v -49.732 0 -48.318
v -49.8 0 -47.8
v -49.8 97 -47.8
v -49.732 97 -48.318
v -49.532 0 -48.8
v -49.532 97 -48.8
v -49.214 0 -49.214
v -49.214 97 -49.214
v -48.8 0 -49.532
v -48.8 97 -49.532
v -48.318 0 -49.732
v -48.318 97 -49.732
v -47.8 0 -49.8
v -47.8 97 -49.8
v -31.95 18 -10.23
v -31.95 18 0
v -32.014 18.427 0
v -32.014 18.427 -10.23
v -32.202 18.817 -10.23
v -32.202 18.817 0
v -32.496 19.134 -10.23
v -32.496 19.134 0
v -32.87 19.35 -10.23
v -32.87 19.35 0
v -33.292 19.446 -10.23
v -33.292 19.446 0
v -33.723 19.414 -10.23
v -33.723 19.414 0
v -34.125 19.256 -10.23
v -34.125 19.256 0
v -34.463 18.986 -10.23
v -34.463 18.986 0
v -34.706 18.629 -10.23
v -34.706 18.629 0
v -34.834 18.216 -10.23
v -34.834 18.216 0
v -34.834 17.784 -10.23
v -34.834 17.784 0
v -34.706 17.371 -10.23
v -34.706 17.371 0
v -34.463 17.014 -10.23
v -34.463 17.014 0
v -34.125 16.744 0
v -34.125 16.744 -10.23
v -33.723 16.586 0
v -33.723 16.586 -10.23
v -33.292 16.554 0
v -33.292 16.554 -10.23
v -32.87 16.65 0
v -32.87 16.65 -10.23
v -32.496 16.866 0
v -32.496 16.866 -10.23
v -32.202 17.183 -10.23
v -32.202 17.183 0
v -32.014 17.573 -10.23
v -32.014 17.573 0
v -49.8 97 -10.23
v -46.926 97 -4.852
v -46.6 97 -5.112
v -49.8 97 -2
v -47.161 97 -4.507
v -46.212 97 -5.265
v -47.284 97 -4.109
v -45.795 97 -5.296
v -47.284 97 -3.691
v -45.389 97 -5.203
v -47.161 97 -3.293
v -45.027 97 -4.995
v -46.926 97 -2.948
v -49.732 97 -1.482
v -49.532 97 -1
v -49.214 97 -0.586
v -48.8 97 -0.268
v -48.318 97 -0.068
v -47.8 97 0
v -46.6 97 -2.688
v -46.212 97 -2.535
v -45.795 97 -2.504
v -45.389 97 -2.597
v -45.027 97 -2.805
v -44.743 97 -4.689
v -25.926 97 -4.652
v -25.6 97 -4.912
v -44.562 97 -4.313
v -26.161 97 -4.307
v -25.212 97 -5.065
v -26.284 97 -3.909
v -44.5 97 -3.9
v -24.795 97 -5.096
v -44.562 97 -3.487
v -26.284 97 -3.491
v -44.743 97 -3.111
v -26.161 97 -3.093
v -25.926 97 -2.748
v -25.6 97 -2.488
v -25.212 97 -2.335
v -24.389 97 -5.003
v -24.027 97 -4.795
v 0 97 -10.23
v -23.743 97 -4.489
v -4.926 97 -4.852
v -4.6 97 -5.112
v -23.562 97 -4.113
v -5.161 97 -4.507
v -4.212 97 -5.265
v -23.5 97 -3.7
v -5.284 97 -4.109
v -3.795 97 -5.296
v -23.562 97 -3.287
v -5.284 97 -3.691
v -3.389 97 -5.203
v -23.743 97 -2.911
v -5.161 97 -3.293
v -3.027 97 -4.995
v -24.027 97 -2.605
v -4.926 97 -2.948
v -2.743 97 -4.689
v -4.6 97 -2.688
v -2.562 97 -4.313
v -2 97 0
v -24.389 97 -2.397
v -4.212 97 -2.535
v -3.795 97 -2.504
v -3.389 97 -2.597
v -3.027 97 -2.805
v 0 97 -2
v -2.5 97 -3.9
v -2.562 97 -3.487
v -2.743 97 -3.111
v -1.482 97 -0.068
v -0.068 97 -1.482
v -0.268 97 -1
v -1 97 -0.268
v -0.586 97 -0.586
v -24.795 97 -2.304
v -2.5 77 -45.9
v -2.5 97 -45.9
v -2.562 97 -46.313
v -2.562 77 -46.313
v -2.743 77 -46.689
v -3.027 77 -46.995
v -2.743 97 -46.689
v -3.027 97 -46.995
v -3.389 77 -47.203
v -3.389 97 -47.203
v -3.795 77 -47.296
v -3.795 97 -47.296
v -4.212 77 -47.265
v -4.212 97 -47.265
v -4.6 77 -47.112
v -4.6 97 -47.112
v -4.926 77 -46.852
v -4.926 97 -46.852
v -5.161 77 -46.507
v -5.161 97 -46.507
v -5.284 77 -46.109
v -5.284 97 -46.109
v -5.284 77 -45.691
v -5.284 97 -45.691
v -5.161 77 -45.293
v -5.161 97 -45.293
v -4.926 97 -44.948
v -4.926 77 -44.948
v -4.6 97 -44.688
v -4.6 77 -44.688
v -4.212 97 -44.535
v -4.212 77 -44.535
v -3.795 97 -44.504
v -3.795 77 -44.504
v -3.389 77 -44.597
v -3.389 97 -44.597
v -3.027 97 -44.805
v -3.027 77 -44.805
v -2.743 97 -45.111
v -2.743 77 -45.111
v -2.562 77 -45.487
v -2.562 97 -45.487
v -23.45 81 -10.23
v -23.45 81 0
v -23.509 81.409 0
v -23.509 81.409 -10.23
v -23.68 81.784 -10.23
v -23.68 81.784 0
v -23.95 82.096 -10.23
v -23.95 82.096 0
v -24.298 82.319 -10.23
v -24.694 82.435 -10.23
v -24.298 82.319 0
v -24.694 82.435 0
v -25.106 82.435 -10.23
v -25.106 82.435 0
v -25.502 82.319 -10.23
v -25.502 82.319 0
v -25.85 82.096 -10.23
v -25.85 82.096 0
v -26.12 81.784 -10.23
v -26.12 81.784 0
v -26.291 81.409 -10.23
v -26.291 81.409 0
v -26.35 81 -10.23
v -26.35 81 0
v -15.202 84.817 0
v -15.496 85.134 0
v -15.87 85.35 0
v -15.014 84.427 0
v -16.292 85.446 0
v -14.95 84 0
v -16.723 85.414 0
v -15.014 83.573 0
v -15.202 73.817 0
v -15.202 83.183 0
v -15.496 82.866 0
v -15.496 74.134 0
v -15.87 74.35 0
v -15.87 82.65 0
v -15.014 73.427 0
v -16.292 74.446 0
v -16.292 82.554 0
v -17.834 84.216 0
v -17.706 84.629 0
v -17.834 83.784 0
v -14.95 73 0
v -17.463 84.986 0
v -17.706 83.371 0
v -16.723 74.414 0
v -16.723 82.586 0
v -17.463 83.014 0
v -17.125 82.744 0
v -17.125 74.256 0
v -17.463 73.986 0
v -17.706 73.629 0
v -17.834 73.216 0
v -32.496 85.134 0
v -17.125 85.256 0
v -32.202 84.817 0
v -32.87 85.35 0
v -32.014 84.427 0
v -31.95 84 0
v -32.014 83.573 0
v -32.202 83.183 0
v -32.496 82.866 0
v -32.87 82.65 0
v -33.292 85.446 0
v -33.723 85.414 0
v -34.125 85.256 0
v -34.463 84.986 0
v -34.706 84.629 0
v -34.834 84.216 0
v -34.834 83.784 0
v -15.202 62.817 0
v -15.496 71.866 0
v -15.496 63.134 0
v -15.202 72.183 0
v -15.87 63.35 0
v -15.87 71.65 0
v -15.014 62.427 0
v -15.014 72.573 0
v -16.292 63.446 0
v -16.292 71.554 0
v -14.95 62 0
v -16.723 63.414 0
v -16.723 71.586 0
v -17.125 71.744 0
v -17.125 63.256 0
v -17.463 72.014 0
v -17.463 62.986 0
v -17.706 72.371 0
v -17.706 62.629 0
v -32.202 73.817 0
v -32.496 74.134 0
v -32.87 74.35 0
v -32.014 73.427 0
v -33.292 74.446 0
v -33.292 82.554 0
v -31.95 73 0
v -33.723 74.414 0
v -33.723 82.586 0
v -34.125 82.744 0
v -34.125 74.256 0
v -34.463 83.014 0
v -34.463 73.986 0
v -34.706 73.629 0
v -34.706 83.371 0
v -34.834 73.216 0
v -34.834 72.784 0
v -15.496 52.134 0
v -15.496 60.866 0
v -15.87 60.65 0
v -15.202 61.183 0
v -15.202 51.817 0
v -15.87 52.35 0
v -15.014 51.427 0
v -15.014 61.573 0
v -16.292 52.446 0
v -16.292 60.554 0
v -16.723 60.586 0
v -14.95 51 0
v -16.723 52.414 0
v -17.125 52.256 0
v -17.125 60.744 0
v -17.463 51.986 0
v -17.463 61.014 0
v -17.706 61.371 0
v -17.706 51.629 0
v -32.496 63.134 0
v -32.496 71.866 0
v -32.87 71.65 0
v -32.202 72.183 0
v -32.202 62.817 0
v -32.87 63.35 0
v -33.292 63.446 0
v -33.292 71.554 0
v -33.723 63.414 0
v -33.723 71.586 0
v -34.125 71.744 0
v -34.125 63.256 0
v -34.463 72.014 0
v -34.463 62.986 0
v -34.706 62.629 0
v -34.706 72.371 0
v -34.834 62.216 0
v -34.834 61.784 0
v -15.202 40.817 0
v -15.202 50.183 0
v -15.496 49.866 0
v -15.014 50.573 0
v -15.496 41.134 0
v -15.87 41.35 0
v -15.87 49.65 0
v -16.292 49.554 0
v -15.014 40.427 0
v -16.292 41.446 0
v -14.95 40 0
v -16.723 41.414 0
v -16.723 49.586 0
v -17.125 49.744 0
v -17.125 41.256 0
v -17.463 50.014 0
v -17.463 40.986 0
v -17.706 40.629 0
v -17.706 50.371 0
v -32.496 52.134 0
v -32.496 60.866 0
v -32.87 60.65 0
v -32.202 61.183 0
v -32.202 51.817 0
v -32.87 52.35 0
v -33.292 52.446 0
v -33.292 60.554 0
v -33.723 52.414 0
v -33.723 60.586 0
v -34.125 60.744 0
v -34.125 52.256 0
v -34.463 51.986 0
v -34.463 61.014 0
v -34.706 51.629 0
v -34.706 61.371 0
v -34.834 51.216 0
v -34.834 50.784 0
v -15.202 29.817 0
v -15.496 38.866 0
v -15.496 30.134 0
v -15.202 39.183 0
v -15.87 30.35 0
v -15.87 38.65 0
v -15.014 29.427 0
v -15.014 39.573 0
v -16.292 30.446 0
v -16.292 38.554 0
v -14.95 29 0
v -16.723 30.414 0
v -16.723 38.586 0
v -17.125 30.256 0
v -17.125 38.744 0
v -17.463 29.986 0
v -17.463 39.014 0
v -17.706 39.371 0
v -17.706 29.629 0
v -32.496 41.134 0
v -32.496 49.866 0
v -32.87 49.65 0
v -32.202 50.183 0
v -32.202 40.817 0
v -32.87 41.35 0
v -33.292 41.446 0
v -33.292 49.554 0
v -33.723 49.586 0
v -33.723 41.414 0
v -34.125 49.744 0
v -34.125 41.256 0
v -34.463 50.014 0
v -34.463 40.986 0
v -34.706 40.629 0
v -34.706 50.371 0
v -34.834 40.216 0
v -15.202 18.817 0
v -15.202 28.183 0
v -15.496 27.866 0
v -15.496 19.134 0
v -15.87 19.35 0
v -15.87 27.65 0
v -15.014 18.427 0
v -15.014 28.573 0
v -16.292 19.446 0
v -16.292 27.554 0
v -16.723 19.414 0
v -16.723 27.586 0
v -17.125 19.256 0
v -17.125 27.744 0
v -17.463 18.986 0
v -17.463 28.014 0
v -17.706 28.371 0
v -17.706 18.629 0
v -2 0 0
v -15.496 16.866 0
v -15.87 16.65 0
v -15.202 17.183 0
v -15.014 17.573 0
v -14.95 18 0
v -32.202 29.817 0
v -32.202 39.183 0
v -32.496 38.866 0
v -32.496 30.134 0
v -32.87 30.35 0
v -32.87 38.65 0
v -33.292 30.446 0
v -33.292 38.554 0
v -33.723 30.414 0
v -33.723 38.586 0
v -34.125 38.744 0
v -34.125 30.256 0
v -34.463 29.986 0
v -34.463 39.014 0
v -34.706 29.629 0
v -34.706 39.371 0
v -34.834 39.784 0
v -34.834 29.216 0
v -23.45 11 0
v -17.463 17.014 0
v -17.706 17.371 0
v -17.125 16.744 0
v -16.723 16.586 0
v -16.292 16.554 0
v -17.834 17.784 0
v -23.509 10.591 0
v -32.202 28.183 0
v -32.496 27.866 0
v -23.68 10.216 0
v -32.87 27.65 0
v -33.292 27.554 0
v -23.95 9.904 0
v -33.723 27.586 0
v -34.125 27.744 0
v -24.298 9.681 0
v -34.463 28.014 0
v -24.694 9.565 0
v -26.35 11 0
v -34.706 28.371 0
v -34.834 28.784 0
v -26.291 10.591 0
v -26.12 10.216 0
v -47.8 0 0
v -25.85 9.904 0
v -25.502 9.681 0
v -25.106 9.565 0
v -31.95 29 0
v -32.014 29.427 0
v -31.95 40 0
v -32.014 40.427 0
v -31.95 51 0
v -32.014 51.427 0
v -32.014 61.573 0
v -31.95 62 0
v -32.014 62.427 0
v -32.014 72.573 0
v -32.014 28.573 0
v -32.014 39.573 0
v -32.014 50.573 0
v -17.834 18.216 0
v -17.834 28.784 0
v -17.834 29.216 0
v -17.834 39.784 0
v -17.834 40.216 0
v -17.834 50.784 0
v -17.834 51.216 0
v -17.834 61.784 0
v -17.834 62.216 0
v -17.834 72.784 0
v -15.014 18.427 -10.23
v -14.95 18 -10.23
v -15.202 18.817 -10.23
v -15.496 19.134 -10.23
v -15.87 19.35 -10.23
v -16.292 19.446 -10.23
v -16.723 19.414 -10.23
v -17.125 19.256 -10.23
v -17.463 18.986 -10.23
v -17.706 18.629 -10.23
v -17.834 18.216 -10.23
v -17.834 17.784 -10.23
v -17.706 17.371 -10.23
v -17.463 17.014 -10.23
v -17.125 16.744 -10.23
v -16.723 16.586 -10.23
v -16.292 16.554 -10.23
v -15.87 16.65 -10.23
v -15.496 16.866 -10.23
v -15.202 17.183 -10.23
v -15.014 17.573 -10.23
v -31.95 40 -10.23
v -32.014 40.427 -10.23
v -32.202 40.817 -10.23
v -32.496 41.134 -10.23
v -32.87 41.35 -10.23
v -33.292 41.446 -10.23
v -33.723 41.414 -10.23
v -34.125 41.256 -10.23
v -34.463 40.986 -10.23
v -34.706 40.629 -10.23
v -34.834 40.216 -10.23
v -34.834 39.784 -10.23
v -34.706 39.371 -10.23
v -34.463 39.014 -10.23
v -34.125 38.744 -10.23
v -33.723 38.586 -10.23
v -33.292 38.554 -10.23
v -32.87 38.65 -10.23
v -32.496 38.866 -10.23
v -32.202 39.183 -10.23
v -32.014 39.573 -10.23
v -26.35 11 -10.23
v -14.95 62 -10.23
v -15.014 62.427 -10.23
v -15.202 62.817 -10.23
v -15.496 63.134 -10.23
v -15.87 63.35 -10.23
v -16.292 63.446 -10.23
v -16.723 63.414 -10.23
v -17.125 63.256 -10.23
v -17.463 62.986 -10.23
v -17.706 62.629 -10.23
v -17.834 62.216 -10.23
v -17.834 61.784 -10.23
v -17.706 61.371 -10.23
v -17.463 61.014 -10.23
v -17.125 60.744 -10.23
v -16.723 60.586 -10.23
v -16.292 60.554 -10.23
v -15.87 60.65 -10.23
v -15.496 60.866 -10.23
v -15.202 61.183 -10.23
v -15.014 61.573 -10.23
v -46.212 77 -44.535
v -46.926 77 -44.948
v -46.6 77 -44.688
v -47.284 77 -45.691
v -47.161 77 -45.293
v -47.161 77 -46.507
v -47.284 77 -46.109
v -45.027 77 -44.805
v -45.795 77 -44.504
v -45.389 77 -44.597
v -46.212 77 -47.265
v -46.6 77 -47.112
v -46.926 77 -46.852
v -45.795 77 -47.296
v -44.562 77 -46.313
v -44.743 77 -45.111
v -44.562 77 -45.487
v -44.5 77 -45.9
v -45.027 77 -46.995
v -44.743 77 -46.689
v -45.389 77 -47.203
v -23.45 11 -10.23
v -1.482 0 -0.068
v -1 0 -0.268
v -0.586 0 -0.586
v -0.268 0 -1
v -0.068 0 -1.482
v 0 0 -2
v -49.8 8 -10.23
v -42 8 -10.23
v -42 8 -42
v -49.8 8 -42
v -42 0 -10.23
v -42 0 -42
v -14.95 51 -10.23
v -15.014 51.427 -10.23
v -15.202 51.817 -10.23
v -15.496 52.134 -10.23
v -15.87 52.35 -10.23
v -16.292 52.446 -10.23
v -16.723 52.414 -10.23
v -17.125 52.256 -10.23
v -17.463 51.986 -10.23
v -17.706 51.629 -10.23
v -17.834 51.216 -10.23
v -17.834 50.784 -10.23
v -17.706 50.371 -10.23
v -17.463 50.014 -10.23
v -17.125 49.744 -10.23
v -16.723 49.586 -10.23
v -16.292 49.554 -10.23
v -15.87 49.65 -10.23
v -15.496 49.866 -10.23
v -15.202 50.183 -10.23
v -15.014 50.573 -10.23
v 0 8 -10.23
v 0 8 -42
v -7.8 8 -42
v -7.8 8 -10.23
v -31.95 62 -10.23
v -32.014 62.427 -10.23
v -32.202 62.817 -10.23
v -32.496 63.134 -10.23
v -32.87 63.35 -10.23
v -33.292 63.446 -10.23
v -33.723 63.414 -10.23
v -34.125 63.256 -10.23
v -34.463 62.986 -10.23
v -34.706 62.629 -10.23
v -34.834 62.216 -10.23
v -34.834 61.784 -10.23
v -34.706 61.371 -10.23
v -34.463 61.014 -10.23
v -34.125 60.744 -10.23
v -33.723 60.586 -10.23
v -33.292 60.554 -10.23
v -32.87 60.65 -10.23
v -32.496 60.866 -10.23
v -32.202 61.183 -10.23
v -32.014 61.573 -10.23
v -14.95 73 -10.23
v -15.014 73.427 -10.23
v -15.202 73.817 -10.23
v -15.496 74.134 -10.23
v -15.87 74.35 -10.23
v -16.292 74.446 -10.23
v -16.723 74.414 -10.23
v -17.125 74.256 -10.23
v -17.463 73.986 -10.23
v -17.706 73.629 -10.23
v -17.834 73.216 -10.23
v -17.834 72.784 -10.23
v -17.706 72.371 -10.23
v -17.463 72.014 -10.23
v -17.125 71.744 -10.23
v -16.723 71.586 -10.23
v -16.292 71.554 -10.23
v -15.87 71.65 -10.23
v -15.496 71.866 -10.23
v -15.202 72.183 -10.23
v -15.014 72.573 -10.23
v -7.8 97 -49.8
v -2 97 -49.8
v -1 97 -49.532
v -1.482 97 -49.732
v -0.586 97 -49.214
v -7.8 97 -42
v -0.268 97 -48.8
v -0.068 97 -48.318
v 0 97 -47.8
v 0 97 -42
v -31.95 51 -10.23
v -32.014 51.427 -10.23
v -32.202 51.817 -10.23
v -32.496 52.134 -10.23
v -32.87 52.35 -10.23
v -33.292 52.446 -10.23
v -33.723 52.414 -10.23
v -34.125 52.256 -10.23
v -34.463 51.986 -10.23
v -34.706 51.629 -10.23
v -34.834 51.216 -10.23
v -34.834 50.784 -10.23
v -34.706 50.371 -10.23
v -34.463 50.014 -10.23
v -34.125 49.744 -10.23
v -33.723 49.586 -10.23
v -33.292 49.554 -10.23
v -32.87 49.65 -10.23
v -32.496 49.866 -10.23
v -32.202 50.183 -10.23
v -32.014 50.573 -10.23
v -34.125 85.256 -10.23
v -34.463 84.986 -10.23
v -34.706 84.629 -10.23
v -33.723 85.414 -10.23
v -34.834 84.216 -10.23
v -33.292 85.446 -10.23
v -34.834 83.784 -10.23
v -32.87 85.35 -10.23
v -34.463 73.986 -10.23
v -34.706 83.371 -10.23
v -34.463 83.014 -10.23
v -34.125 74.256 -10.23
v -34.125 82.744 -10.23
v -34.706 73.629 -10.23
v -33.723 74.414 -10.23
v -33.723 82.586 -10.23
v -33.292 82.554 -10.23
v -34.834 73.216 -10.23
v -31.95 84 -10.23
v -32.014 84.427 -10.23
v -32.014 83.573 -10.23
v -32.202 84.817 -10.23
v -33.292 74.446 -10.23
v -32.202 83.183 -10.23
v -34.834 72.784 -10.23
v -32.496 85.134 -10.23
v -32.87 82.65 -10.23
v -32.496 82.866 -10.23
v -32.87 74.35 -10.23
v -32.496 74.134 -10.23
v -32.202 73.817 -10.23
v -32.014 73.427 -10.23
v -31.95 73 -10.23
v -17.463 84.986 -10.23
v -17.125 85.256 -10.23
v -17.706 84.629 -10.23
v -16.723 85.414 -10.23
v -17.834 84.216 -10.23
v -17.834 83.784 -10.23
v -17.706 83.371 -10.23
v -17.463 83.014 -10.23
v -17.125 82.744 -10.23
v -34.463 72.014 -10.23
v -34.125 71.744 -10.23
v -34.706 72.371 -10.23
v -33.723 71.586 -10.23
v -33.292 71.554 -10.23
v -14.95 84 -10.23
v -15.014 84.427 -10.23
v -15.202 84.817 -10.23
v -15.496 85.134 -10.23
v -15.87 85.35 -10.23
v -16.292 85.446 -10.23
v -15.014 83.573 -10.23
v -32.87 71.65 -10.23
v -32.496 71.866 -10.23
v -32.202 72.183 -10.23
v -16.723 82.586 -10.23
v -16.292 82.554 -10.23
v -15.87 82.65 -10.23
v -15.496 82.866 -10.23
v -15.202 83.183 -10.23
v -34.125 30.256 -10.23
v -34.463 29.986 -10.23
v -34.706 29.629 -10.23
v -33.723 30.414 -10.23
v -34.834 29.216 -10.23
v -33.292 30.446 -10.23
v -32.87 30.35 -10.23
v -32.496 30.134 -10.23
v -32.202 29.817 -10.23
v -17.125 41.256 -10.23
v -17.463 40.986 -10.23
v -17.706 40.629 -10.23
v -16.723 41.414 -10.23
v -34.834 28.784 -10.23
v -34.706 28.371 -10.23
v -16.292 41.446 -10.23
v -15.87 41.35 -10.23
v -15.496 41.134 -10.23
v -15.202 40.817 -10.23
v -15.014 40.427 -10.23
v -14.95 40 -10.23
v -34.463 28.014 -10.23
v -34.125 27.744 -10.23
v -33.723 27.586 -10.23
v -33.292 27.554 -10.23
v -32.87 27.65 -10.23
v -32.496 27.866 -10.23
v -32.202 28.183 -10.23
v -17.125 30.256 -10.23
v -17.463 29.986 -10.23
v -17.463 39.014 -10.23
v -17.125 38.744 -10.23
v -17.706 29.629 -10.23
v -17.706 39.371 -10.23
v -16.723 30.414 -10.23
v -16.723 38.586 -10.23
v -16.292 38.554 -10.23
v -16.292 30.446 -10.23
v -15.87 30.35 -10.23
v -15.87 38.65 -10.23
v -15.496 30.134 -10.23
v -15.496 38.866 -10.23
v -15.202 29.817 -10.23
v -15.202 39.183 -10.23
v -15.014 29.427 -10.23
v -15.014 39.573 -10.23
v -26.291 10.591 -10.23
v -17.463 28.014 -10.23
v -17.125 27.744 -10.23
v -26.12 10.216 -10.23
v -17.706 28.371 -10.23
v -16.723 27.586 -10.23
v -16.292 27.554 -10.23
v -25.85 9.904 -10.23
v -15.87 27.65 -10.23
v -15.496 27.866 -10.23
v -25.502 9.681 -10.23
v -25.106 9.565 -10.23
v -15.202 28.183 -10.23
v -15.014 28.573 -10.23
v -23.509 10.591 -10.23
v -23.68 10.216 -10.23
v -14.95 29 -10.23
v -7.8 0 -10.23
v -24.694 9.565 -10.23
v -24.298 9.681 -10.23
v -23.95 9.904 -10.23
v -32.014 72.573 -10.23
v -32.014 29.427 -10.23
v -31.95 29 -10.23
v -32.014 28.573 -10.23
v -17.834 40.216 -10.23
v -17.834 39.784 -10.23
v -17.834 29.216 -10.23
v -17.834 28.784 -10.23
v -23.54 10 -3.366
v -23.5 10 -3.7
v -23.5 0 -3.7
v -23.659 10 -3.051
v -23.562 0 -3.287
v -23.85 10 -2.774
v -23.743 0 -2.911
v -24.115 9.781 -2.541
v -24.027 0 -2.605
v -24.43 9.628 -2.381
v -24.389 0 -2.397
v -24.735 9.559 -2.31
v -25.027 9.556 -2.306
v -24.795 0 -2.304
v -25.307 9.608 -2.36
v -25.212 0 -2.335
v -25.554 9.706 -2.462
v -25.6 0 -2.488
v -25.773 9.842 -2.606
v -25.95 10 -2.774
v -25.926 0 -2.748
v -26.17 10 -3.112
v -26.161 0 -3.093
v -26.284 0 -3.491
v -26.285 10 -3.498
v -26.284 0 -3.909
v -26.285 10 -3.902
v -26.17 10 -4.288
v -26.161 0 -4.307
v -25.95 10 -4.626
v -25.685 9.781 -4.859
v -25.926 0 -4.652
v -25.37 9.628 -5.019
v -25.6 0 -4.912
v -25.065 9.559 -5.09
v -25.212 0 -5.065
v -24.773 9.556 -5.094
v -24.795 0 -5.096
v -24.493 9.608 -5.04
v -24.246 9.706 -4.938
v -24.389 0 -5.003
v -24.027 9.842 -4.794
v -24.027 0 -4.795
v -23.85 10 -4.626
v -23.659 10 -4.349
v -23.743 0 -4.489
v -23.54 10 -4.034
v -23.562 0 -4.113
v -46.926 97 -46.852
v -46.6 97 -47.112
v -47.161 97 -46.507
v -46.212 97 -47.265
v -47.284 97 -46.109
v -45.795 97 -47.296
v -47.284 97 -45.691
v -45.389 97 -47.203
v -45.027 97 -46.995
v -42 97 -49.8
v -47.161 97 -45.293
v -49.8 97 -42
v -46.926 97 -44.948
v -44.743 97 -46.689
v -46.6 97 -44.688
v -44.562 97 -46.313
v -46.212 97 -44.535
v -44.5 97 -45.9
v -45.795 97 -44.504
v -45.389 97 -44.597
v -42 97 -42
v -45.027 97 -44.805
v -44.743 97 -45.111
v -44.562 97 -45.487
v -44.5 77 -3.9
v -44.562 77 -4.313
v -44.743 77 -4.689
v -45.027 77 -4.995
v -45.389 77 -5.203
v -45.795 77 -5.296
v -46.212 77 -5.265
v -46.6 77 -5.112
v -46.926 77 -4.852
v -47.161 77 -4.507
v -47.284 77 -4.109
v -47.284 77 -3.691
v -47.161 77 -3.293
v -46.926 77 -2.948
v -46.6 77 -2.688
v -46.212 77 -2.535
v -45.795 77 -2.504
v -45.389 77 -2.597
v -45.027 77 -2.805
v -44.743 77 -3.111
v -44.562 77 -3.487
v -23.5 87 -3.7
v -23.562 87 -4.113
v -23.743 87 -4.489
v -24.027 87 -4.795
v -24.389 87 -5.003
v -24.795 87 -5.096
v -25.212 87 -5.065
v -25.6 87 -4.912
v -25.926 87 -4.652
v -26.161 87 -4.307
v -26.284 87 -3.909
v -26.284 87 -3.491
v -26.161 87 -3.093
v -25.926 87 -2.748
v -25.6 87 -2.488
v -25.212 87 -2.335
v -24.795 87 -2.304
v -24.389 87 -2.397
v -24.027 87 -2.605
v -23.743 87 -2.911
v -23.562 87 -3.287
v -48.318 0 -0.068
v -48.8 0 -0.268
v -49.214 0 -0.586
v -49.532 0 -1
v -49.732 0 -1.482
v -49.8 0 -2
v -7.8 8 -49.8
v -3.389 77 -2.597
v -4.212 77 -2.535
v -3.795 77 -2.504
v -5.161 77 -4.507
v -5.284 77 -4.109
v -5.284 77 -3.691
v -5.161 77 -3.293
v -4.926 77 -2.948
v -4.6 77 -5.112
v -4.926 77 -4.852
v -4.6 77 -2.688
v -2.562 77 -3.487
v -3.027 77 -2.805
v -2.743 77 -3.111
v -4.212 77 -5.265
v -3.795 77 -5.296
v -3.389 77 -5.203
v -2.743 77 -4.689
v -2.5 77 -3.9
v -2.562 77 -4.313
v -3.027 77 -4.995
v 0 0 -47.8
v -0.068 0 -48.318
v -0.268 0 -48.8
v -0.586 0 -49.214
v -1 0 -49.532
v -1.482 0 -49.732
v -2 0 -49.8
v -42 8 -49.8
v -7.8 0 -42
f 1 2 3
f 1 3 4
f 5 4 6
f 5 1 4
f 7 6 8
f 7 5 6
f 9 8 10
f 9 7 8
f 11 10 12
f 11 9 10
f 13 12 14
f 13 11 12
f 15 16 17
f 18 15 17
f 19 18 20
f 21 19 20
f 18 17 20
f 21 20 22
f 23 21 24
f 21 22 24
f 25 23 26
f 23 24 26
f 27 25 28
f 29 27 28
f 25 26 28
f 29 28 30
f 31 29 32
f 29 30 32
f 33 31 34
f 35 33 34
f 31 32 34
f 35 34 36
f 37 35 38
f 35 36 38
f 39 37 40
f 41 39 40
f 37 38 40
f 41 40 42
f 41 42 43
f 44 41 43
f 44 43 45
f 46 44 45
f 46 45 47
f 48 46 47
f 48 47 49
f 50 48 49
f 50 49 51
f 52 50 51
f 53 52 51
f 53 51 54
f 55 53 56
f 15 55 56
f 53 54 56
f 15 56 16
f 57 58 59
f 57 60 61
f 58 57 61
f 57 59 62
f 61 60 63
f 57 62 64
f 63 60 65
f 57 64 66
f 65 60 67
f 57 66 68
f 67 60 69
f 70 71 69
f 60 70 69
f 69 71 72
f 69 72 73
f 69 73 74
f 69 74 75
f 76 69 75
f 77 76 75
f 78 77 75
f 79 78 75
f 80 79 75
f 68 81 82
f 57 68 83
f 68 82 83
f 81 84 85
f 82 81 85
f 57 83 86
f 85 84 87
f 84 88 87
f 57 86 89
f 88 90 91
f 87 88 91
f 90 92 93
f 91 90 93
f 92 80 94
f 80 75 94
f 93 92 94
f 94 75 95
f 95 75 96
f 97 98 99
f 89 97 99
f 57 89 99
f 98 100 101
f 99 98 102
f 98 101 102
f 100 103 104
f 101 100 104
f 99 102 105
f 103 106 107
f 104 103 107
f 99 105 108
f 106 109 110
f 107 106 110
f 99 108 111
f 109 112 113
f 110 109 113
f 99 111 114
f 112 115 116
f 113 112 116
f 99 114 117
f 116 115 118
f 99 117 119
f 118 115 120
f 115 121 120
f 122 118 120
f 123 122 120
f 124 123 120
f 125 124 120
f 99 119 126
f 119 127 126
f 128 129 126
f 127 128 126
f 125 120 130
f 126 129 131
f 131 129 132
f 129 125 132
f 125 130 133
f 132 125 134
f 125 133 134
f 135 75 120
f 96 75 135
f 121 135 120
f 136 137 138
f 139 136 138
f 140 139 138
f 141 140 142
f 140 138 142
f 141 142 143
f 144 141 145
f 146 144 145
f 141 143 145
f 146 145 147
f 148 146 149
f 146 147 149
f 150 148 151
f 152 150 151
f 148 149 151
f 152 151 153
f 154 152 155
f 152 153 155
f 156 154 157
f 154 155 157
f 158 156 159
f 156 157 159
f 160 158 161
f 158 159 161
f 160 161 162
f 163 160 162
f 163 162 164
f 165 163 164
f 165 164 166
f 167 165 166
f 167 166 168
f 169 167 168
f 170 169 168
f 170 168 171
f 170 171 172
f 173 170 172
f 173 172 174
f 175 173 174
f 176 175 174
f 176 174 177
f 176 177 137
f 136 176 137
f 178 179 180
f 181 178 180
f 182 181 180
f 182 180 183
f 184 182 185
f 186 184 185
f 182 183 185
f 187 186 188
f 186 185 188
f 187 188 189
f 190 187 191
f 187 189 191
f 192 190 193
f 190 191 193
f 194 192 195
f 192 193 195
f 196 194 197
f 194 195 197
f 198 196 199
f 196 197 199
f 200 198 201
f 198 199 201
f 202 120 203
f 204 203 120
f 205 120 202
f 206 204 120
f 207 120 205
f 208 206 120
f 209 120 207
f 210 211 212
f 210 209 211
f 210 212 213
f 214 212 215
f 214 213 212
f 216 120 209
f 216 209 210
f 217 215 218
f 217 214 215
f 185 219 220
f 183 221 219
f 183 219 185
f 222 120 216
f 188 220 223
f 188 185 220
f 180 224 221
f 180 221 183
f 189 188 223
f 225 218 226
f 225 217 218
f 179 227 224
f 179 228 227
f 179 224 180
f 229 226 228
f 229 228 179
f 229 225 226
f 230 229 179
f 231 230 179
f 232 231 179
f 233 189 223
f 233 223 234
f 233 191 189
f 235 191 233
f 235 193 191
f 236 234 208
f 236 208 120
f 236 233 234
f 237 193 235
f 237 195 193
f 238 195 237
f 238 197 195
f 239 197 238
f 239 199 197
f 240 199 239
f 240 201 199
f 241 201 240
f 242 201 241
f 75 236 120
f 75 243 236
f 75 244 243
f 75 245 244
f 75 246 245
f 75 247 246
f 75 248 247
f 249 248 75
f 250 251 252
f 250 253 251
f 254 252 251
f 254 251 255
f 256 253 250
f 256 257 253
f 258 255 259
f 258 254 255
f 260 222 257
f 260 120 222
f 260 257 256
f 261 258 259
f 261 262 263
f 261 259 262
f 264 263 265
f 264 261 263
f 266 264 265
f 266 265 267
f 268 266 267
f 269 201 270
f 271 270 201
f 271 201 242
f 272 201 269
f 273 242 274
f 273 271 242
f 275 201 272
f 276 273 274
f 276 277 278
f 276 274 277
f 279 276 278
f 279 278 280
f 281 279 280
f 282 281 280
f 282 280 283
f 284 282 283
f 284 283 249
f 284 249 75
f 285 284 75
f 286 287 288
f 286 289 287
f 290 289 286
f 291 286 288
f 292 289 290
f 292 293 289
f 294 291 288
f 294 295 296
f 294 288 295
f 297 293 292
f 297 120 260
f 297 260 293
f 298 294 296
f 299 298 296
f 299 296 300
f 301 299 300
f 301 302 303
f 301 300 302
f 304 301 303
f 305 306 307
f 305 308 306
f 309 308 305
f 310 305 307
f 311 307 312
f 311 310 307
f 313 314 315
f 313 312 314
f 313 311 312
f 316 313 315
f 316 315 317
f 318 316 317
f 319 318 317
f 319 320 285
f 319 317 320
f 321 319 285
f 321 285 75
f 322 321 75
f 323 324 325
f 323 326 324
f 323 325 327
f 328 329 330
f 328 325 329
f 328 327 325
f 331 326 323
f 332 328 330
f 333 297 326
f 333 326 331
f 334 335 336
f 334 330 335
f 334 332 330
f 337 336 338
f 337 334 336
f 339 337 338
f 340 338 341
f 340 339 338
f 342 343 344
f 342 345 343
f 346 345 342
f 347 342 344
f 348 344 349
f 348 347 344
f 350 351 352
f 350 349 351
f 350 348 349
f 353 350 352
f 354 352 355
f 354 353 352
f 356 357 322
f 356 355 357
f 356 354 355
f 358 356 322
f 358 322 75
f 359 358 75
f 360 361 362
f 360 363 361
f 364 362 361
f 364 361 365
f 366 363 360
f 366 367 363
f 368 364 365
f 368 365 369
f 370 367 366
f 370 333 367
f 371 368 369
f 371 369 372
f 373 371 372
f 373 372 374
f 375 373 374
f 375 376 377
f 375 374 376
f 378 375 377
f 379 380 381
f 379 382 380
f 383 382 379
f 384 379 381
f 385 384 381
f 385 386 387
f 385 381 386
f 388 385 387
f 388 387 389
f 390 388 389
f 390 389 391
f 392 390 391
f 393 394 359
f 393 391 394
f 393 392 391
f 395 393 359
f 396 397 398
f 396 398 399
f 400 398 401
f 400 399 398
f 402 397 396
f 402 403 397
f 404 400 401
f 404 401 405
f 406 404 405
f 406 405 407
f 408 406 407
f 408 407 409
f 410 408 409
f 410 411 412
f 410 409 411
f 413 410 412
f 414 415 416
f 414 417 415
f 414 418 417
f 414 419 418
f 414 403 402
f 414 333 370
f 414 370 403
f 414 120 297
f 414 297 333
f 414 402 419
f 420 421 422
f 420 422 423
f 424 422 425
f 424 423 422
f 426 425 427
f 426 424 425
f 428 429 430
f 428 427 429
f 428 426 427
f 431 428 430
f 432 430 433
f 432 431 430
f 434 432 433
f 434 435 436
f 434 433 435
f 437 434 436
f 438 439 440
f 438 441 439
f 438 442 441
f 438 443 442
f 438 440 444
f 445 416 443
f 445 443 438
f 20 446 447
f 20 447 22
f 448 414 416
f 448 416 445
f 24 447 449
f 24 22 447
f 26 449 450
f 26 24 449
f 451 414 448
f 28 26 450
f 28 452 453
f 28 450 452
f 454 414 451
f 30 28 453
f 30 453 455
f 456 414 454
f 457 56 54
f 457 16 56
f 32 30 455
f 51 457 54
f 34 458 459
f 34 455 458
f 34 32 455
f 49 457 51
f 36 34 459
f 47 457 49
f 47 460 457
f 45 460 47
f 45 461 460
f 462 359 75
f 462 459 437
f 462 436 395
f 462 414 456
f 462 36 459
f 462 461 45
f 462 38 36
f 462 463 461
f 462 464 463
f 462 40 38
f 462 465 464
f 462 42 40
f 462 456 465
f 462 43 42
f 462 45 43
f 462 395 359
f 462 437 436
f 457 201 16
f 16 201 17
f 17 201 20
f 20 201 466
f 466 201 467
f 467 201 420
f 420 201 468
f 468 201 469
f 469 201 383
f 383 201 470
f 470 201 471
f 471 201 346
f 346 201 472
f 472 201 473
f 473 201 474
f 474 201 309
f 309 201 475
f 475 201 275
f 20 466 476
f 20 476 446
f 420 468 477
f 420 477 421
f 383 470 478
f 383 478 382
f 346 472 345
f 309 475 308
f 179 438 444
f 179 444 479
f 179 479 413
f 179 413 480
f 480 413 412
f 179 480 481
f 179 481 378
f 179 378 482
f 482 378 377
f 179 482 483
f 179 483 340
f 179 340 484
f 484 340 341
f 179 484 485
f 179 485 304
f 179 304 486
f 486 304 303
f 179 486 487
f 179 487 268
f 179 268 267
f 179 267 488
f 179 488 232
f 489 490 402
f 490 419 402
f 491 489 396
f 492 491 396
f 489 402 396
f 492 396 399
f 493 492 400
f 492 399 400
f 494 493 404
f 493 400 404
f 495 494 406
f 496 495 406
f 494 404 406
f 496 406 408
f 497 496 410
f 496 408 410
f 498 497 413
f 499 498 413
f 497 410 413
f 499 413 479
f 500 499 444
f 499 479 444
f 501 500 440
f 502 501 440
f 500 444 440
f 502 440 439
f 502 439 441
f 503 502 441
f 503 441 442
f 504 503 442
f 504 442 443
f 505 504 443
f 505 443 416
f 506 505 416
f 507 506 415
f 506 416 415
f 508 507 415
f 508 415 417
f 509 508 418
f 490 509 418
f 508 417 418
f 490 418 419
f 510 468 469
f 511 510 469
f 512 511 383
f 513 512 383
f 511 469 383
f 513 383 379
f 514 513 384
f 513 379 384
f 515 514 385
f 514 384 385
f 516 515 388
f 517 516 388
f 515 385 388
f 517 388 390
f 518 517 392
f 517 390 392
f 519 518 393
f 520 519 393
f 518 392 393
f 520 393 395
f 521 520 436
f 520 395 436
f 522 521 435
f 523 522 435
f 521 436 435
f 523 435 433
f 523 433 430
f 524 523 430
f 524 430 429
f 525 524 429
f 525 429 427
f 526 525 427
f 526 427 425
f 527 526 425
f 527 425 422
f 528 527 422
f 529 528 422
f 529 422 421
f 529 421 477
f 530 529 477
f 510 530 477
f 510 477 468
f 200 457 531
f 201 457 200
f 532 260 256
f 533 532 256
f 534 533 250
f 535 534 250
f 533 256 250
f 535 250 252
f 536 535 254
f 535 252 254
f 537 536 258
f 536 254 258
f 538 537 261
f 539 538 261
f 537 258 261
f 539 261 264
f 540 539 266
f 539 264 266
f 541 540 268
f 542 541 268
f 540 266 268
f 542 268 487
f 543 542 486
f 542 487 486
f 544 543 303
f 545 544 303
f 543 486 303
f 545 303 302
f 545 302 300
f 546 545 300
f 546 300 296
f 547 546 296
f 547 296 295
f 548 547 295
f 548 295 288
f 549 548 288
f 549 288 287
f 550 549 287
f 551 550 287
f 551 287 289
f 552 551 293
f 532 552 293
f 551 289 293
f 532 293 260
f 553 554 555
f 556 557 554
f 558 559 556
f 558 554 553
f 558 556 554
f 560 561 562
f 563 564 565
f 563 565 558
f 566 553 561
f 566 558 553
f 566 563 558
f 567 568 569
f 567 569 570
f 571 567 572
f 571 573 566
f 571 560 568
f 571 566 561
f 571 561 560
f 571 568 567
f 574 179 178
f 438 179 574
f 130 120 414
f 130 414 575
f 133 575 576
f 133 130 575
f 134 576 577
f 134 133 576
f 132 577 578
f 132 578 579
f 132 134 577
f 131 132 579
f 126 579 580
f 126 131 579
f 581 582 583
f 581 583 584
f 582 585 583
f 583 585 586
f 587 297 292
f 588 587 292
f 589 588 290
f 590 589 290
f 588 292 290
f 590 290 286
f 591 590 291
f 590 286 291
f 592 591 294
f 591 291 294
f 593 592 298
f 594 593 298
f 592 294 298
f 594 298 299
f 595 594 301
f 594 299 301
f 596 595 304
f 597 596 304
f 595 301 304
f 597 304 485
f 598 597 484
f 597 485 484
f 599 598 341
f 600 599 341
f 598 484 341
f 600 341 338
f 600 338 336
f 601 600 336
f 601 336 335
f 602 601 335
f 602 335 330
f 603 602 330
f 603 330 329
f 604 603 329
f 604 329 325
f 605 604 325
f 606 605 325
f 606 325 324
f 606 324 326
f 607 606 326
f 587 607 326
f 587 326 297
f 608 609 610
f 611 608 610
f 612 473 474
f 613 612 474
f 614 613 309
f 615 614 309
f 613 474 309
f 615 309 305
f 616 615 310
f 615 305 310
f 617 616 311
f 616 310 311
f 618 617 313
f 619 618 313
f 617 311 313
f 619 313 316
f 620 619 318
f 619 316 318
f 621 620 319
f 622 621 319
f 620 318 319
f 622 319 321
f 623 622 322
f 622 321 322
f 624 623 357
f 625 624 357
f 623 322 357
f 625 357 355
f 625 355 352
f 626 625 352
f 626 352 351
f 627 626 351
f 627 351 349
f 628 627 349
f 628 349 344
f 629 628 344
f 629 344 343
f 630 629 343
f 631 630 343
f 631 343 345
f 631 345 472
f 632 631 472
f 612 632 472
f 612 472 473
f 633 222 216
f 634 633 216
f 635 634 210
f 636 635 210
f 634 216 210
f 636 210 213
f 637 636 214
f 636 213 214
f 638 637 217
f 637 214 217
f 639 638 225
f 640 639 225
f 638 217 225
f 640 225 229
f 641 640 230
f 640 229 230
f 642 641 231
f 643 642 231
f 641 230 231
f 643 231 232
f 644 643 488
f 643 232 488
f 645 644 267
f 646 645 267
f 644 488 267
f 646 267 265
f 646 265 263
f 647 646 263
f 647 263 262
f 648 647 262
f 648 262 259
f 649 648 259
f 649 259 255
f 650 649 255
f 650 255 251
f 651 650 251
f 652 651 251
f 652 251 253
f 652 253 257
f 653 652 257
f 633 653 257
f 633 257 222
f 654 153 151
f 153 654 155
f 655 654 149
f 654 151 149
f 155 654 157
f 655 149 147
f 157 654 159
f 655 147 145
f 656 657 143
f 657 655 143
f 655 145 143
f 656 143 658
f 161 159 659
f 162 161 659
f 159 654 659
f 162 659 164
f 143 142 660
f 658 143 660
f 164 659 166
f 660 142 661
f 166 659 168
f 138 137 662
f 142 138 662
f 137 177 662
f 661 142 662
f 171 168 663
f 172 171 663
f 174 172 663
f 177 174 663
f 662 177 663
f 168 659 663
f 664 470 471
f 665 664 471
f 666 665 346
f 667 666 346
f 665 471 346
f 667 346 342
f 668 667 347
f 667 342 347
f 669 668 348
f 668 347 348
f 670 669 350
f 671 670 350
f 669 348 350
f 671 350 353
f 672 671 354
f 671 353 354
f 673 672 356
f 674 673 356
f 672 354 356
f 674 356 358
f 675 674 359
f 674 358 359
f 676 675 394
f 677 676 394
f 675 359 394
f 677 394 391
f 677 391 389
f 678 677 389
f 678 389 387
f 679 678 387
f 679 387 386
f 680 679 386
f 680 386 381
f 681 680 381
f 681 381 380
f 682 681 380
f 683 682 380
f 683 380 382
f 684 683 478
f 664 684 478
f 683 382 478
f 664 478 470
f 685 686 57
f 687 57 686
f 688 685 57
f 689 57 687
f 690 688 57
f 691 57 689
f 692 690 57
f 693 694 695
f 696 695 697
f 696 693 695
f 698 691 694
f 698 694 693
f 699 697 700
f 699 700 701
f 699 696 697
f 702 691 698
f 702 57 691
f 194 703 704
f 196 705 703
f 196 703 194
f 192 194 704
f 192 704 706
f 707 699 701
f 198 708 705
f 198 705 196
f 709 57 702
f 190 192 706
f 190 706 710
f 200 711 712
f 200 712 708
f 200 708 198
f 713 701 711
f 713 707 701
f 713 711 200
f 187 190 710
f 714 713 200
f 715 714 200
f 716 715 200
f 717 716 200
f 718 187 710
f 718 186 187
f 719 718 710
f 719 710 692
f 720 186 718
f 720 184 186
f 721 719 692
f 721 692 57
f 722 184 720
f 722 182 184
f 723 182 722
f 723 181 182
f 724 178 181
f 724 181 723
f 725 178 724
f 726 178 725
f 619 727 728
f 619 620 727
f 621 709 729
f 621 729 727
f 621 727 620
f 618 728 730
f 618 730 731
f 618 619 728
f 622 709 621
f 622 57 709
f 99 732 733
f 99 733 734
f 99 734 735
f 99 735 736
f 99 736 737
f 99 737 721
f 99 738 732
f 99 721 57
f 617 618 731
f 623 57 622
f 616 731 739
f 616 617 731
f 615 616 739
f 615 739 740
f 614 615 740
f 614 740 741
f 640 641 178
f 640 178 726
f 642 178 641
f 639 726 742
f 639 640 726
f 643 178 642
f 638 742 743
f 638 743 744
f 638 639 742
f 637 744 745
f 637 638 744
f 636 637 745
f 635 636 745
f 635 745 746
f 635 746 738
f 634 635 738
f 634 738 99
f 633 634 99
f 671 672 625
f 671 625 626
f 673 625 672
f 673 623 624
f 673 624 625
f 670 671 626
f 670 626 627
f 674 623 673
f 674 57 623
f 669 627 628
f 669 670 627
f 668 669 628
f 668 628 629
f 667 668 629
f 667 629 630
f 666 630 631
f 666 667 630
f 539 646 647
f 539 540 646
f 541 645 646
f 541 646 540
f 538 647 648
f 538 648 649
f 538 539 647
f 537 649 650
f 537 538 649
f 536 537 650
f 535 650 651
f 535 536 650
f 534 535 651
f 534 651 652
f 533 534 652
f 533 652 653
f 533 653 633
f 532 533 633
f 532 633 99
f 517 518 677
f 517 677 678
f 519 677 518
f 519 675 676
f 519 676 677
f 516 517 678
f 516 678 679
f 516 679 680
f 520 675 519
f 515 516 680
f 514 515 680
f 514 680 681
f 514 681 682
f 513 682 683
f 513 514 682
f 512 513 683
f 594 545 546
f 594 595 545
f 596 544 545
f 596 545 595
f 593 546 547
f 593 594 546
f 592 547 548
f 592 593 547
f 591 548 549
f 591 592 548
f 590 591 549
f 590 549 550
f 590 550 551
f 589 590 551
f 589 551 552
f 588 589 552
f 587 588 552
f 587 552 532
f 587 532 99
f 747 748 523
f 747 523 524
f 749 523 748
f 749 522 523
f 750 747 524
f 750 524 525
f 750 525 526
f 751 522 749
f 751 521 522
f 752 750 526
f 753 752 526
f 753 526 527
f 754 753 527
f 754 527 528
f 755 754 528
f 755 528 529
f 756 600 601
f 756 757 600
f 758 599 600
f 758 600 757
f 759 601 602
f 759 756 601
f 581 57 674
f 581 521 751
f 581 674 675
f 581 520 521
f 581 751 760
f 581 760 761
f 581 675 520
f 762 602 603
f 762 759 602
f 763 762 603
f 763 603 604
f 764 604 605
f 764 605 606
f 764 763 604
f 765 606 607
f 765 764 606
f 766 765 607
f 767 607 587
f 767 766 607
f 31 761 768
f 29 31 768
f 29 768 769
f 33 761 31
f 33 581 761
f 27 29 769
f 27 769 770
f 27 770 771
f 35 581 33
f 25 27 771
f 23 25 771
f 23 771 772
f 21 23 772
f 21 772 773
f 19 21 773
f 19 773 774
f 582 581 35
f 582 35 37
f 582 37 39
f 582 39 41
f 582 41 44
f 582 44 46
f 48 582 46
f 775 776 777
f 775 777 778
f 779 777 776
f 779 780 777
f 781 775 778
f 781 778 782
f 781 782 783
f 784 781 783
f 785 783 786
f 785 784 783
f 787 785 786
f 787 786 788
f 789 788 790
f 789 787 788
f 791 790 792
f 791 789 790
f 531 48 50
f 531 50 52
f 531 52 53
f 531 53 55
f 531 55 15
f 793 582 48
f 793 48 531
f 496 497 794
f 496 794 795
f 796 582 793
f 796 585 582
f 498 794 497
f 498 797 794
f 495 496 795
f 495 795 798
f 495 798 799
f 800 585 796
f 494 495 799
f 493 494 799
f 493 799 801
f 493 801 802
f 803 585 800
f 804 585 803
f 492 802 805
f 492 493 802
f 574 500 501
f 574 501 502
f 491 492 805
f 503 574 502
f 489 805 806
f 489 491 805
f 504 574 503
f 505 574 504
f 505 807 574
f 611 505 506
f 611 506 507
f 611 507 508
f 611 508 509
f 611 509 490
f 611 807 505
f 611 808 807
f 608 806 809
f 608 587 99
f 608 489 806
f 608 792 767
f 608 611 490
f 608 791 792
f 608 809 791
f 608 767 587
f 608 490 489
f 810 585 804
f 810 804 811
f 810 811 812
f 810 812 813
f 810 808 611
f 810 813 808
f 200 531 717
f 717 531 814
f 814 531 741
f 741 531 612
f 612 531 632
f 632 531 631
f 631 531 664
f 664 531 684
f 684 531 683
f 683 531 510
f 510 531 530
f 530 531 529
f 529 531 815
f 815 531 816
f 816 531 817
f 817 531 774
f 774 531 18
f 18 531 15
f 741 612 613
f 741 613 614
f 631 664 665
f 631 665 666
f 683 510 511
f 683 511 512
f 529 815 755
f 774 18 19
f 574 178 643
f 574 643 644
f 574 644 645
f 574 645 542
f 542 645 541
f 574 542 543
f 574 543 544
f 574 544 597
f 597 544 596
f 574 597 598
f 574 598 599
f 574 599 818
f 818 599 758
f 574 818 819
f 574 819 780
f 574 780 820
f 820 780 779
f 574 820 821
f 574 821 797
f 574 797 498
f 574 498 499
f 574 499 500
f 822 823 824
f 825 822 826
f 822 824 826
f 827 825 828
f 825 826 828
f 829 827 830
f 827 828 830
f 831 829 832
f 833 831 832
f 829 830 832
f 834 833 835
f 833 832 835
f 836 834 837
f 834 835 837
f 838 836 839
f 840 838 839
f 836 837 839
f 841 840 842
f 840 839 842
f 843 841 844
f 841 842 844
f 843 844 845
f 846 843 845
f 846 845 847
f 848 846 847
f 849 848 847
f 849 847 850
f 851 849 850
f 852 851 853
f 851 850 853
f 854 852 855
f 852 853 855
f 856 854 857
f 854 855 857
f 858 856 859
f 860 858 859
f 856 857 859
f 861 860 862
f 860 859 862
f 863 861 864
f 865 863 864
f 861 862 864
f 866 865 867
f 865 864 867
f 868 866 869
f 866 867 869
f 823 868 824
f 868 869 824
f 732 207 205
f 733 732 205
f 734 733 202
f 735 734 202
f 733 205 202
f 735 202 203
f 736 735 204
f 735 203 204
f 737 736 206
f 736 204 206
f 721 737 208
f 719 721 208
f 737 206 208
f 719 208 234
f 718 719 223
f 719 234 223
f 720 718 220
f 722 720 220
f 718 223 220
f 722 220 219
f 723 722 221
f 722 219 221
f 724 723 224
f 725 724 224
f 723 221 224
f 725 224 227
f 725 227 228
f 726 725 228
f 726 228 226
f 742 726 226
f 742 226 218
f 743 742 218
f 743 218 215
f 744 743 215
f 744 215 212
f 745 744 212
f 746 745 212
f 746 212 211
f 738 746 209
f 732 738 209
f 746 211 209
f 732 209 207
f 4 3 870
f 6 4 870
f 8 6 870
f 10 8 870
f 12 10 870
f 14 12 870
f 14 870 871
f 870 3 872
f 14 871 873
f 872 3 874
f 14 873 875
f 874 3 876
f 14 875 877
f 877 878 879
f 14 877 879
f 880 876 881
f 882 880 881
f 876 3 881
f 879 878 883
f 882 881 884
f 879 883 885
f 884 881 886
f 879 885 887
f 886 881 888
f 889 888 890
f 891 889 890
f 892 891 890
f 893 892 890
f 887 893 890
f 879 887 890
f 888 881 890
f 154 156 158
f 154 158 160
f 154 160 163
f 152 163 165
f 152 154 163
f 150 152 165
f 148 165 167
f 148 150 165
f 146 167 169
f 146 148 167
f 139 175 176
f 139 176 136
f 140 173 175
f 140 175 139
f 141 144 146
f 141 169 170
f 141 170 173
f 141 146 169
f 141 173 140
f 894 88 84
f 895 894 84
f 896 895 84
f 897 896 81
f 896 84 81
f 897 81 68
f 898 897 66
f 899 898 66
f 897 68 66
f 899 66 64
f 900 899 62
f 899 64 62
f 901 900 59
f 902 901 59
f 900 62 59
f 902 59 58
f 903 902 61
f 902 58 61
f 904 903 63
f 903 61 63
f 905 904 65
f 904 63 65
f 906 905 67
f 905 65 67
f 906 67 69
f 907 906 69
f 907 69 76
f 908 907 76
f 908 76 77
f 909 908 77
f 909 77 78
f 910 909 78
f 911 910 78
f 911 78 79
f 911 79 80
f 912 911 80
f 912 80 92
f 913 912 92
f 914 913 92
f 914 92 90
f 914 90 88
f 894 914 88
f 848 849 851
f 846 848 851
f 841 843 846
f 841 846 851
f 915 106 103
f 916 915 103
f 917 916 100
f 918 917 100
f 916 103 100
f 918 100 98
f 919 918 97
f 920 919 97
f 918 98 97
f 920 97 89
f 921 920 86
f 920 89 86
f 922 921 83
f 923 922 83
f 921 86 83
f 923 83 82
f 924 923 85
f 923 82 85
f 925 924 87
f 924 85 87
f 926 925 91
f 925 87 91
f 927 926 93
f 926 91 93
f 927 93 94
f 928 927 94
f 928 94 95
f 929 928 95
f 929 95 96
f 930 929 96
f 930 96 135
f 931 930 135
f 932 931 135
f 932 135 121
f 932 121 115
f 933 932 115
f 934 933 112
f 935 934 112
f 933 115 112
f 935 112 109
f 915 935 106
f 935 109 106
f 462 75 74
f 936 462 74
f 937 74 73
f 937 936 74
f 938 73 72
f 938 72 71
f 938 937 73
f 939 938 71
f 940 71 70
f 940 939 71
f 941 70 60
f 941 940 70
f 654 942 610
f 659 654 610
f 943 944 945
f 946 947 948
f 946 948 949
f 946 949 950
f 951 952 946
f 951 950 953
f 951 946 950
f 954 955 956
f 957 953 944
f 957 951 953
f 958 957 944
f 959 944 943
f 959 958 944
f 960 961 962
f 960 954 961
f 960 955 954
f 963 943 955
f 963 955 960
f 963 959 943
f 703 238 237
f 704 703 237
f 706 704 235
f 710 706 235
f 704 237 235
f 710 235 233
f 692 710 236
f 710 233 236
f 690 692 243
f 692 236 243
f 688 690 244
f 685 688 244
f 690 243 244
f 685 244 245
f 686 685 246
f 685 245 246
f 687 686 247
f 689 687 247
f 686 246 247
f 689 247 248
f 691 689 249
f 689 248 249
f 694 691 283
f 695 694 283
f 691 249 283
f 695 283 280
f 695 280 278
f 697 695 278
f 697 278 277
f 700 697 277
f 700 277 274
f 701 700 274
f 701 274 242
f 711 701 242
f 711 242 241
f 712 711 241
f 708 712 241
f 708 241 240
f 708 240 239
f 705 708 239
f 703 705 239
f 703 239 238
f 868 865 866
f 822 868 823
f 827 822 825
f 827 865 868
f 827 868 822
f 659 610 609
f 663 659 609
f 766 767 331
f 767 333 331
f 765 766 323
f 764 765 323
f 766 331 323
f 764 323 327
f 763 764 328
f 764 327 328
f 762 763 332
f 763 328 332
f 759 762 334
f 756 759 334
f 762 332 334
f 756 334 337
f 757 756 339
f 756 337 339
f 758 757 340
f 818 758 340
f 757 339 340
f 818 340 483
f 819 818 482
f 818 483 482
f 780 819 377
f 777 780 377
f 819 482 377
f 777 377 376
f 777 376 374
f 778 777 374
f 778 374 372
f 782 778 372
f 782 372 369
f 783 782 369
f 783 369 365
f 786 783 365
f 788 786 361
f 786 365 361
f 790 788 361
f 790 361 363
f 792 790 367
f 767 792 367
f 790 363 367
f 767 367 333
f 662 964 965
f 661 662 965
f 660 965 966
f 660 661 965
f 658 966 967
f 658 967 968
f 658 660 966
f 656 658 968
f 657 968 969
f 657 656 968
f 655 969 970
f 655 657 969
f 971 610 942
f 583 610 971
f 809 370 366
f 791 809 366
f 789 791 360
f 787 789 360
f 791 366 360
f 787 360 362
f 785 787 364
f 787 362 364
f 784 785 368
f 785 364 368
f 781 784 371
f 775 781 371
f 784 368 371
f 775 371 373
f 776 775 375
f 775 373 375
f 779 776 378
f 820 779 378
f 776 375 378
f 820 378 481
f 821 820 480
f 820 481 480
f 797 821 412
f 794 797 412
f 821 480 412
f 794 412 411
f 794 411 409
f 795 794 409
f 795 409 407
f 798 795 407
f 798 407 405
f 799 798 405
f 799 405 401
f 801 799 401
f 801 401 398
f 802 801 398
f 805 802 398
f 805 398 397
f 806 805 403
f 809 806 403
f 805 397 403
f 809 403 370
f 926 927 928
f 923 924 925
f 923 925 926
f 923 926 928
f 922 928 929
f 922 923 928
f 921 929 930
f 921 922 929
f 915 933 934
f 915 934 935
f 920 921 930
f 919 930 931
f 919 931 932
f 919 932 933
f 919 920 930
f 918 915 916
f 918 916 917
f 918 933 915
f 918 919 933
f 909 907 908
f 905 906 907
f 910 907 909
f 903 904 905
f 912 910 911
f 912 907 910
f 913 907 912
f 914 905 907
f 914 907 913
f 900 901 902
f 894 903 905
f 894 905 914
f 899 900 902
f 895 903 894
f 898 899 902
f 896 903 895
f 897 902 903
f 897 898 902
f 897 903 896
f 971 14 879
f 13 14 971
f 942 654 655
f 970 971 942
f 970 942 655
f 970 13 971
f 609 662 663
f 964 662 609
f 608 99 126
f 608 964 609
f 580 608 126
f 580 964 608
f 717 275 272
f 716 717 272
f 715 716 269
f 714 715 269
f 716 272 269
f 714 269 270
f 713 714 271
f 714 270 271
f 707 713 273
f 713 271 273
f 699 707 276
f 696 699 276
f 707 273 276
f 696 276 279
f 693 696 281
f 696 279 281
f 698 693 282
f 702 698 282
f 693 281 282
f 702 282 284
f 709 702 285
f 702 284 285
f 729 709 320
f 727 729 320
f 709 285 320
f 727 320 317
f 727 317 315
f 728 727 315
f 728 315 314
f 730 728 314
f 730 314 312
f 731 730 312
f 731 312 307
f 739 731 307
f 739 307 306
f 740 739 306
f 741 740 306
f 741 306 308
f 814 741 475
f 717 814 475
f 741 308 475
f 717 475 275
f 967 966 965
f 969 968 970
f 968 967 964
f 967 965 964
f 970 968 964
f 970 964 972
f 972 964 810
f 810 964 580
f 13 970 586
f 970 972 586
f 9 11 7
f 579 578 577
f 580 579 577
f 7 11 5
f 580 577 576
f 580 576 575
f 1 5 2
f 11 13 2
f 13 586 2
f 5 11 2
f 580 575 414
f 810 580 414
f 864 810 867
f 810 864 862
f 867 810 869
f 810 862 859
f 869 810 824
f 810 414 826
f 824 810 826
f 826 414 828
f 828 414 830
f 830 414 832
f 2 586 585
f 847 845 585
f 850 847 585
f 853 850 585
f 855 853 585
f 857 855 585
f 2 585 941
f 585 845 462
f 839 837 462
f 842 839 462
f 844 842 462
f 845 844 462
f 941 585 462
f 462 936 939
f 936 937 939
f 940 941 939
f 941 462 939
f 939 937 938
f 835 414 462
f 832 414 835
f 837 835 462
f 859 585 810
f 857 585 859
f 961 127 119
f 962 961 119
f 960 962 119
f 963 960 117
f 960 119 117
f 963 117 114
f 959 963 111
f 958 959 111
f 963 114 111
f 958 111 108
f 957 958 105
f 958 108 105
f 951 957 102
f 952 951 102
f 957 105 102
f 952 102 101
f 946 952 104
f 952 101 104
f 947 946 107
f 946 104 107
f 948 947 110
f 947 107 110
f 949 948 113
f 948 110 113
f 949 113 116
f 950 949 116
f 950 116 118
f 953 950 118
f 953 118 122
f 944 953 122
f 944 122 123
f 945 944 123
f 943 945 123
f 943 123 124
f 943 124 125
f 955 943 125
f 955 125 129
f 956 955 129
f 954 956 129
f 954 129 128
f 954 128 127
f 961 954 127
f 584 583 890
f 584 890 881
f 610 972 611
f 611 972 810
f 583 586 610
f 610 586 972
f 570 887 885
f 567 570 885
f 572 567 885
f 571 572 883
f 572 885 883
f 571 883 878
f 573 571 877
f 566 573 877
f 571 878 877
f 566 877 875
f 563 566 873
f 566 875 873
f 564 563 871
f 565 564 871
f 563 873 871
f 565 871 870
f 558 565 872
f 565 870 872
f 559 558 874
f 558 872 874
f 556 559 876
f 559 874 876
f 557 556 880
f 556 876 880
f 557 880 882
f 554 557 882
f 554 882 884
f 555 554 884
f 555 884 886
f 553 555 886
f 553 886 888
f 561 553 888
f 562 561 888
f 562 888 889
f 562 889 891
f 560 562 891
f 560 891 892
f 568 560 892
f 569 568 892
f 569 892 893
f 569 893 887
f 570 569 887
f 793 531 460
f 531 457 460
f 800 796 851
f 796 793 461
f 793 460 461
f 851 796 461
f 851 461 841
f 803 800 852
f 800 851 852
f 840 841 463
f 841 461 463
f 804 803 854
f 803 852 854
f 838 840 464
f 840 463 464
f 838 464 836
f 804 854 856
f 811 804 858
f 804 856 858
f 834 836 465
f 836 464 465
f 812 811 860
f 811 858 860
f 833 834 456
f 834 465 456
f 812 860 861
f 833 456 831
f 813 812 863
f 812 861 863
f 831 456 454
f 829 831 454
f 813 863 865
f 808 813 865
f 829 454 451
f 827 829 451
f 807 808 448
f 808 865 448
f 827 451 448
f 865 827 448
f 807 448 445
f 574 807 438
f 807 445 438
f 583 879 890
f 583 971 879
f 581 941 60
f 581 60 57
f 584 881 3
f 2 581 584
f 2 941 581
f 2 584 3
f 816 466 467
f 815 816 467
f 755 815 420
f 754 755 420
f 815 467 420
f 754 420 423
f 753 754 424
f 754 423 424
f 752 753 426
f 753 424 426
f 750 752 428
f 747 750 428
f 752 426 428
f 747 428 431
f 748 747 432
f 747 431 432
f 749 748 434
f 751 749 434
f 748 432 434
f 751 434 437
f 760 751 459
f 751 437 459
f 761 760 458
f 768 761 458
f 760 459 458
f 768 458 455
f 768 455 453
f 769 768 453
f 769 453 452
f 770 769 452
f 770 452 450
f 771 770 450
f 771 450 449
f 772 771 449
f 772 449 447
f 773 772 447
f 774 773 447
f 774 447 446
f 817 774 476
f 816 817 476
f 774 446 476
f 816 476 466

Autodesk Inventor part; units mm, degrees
ref_plane "YZ Plane" through (0, 0, 0) normal (1, 0, 0) x (0, 1, 0)
ref_plane "XZ Plane" through (0, 0, 0) normal (0, 1, 0) x (-1, 0, 0)
ref_plane "XY Plane" through (0, 0, 0) normal (0, 0, 1) x (1, 0, 0)
sketch "Sketch1" plane through (0, 0, 0) normal (0, 1, 0) x (-1, 0, 0)
  line L0 (0, 0) -> (49.8, 0)
  line L1 (49.8, 0) -> (49.8, -49.8)
  line L2 (49.8, -49.8) -> (0, -49.8)
  line L3 (0, -49.8) -> (0, 0)
  line L4 (7.8, -7.8) -> (42, -7.8)
  line L5 (42, -7.8) -> (42, -42)
  line L6 (42, -42) -> (7.8, -42)
  line L7 (7.8, -42) -> (7.8, -7.8)
  dimension "d0" = 49.8
  dimension "d1" = 49.8
  dimension "d2" = 7.8
extrude "Extrusion1" add sketch "Sketch1" along normal blind 8
sketch "Sketch3" plane through (0, 0, 0) normal (0, -1, 0) x (1, 0, 0)
  line L0 (-49.8, 0) -> (0, 0) projected
  line L1 (-49.8, -49.8) -> (-49.8, 0) projected
  line L2 (0, 0) -> (-49.8, 0)
  line L3 (-49.8, 0) -> (-49.8, -10.23)
  line L4 (-49.8, -10.23) -> (0, -10.23)
  line L5 (0, -10.23) -> (0, 0)
  line L6 (-7.8, -42) -> (-7.8, -7.8) projected
  line L7 (0, -49.8) -> (-7.8, -49.8)
  line L8 (-7.8, -49.8) -> (-7.8, -42)
  line L9 (-7.8, -42) -> (0, -42)
  line L10 (0, -42) -> (0, -49.8)
  line L11 (0, -49.8) -> (-49.8, -49.8) projected
  line L12 (-42, -7.8) -> (-42, -42) projected
  line L13 (-49.8, -49.8) -> (-42, -49.8)
  line L14 (-42, -49.8) -> (-42, -42)
  line L15 (-42, -42) -> (-49.8, -42)
  line L16 (-49.8, -42) -> (-49.8, -49.8)
  dimension "d6" = 10.23
extrude "Extrusion2" add sketch "Sketch3" against normal blind 97 contours L0 L5 L4 L1 | L15 L14 L11 L1 | L9 L10 L7 L8
sketch "Sketch4" plane through (-49.8, 0, 0) normal (0, 0, 1) x (1, 0, 0)
  line L0 (23.45, 81) -> (26.35, 81)
  line L1 (26.35, 81) -> (26.35, 11)
  line L2 (26.35, 11) -> (23.45, 11)
  line L3 (23.45, 11) -> (23.45, 81)
  line L4 (49.8, 0) -> (49.8, 97) projected
  line L5 (0, 0) -> (49.8, 0) projected
  circle A0 centre (24.9, 81) radius 1.45
  circle A1 centre (24.9, 11) radius 1.45
  circle A2 centre (16.4, 84) radius 1.45
  circle A3 centre (33.4, 84) radius 1.45
  line L6 (0, 97) -> (49.8, 97) projected
  circle A4 centre (16.4, 73) radius 1.45
  circle A5 centre (33.4, 73) radius 1.45
  circle A6 centre (16.4, 62) radius 1.45
  circle A7 centre (33.4, 62) radius 1.45
  circle A8 centre (16.4, 51) radius 1.45
  circle A9 centre (33.4, 51) radius 1.45
  circle A10 centre (16.4, 40) radius 1.45
  circle A11 centre (33.4, 40) radius 1.45
  circle A12 centre (16.4, 29) radius 1.45
  circle A13 centre (33.4, 29) radius 1.45
  circle A14 centre (16.4, 18) radius 1.45
  circle A15 centre (33.4, 18) radius 1.45
  dimension "d9" = 2.9
  dimension "d10" = 70
  dimension "d11" = 23.45
  dimension "d12" = 11
  dimension "d15" = 2.9
  dimension "d16" = 7.05
  dimension "d17" = 2.9
  dimension "d18" = 7.05
  dimension "d19" = 13
  dimension "d20" = 13
  dimension "d23" = 11
extrude "Extrusion3" cut sketch "Sketch4" against normal through all
sketch "Sketch5" plane through (0, 97, 0) normal (0, 1, 0) x (1, 0, 0)
  circle A0 centre (-45.9, 45.9) radius 1.4
  circle A1 centre (-3.9, 45.9) radius 1.4
  line L0 (-49.8, 49.8) -> (-49.8, 0) projected
  line L1 (-49.8, 24.9) -> (-42, 24.9)
  line L2 (-42, 10.23) -> (-42, 42) projected
  circle A2 centre (-45.9, 3.9) radius 1.4
  circle A3 centre (-3.9, 3.9) radius 1.4
  point P0 (0, 0)
  dimension "d28" = 2.8
  dimension "d29" = 2.8
extrude "Extrusion4" cut sketch "Sketch5" against normal blind 20
sketch "Sketch6" plane through (0, 0, 0) normal (0, -1, 0) x (1, 0, 0)
  line L0 (-49.8, 0) -> (0, 0) projected
  circle A0 centre (-24.9, -3.7) radius 1.4
  line L1 (-49.8, -49.8) -> (-49.8, 0) projected
  dimension "d37" = 2.8
  dimension "d38" = 3.7
  dimension "d39" = 24.9
extrude "Extrusion5" cut sketch "Sketch6" against normal blind 10
fillet "Fillet1" radius 2 4 edges at (0, 48.5, 0) (0, 48.5, -49.8) (-49.8, 48.5, -49.8) (-49.8, 48.5, 0)
sketch "Sketch7" plane through (0, 97, 0) normal (0, 1, 0) x (1, 0, 0)
  circle A0 centre (-24.9, 3.7) radius 1.4 projected
  circle A1 centre (-24.9, 3.7) radius 1.4
  point P0 (0, 0)
extrude "Extrusion6" cut sketch "Sketch7" against normal blind 10
properties part number "00_Linear_Stage_NEMA11_Mount"
